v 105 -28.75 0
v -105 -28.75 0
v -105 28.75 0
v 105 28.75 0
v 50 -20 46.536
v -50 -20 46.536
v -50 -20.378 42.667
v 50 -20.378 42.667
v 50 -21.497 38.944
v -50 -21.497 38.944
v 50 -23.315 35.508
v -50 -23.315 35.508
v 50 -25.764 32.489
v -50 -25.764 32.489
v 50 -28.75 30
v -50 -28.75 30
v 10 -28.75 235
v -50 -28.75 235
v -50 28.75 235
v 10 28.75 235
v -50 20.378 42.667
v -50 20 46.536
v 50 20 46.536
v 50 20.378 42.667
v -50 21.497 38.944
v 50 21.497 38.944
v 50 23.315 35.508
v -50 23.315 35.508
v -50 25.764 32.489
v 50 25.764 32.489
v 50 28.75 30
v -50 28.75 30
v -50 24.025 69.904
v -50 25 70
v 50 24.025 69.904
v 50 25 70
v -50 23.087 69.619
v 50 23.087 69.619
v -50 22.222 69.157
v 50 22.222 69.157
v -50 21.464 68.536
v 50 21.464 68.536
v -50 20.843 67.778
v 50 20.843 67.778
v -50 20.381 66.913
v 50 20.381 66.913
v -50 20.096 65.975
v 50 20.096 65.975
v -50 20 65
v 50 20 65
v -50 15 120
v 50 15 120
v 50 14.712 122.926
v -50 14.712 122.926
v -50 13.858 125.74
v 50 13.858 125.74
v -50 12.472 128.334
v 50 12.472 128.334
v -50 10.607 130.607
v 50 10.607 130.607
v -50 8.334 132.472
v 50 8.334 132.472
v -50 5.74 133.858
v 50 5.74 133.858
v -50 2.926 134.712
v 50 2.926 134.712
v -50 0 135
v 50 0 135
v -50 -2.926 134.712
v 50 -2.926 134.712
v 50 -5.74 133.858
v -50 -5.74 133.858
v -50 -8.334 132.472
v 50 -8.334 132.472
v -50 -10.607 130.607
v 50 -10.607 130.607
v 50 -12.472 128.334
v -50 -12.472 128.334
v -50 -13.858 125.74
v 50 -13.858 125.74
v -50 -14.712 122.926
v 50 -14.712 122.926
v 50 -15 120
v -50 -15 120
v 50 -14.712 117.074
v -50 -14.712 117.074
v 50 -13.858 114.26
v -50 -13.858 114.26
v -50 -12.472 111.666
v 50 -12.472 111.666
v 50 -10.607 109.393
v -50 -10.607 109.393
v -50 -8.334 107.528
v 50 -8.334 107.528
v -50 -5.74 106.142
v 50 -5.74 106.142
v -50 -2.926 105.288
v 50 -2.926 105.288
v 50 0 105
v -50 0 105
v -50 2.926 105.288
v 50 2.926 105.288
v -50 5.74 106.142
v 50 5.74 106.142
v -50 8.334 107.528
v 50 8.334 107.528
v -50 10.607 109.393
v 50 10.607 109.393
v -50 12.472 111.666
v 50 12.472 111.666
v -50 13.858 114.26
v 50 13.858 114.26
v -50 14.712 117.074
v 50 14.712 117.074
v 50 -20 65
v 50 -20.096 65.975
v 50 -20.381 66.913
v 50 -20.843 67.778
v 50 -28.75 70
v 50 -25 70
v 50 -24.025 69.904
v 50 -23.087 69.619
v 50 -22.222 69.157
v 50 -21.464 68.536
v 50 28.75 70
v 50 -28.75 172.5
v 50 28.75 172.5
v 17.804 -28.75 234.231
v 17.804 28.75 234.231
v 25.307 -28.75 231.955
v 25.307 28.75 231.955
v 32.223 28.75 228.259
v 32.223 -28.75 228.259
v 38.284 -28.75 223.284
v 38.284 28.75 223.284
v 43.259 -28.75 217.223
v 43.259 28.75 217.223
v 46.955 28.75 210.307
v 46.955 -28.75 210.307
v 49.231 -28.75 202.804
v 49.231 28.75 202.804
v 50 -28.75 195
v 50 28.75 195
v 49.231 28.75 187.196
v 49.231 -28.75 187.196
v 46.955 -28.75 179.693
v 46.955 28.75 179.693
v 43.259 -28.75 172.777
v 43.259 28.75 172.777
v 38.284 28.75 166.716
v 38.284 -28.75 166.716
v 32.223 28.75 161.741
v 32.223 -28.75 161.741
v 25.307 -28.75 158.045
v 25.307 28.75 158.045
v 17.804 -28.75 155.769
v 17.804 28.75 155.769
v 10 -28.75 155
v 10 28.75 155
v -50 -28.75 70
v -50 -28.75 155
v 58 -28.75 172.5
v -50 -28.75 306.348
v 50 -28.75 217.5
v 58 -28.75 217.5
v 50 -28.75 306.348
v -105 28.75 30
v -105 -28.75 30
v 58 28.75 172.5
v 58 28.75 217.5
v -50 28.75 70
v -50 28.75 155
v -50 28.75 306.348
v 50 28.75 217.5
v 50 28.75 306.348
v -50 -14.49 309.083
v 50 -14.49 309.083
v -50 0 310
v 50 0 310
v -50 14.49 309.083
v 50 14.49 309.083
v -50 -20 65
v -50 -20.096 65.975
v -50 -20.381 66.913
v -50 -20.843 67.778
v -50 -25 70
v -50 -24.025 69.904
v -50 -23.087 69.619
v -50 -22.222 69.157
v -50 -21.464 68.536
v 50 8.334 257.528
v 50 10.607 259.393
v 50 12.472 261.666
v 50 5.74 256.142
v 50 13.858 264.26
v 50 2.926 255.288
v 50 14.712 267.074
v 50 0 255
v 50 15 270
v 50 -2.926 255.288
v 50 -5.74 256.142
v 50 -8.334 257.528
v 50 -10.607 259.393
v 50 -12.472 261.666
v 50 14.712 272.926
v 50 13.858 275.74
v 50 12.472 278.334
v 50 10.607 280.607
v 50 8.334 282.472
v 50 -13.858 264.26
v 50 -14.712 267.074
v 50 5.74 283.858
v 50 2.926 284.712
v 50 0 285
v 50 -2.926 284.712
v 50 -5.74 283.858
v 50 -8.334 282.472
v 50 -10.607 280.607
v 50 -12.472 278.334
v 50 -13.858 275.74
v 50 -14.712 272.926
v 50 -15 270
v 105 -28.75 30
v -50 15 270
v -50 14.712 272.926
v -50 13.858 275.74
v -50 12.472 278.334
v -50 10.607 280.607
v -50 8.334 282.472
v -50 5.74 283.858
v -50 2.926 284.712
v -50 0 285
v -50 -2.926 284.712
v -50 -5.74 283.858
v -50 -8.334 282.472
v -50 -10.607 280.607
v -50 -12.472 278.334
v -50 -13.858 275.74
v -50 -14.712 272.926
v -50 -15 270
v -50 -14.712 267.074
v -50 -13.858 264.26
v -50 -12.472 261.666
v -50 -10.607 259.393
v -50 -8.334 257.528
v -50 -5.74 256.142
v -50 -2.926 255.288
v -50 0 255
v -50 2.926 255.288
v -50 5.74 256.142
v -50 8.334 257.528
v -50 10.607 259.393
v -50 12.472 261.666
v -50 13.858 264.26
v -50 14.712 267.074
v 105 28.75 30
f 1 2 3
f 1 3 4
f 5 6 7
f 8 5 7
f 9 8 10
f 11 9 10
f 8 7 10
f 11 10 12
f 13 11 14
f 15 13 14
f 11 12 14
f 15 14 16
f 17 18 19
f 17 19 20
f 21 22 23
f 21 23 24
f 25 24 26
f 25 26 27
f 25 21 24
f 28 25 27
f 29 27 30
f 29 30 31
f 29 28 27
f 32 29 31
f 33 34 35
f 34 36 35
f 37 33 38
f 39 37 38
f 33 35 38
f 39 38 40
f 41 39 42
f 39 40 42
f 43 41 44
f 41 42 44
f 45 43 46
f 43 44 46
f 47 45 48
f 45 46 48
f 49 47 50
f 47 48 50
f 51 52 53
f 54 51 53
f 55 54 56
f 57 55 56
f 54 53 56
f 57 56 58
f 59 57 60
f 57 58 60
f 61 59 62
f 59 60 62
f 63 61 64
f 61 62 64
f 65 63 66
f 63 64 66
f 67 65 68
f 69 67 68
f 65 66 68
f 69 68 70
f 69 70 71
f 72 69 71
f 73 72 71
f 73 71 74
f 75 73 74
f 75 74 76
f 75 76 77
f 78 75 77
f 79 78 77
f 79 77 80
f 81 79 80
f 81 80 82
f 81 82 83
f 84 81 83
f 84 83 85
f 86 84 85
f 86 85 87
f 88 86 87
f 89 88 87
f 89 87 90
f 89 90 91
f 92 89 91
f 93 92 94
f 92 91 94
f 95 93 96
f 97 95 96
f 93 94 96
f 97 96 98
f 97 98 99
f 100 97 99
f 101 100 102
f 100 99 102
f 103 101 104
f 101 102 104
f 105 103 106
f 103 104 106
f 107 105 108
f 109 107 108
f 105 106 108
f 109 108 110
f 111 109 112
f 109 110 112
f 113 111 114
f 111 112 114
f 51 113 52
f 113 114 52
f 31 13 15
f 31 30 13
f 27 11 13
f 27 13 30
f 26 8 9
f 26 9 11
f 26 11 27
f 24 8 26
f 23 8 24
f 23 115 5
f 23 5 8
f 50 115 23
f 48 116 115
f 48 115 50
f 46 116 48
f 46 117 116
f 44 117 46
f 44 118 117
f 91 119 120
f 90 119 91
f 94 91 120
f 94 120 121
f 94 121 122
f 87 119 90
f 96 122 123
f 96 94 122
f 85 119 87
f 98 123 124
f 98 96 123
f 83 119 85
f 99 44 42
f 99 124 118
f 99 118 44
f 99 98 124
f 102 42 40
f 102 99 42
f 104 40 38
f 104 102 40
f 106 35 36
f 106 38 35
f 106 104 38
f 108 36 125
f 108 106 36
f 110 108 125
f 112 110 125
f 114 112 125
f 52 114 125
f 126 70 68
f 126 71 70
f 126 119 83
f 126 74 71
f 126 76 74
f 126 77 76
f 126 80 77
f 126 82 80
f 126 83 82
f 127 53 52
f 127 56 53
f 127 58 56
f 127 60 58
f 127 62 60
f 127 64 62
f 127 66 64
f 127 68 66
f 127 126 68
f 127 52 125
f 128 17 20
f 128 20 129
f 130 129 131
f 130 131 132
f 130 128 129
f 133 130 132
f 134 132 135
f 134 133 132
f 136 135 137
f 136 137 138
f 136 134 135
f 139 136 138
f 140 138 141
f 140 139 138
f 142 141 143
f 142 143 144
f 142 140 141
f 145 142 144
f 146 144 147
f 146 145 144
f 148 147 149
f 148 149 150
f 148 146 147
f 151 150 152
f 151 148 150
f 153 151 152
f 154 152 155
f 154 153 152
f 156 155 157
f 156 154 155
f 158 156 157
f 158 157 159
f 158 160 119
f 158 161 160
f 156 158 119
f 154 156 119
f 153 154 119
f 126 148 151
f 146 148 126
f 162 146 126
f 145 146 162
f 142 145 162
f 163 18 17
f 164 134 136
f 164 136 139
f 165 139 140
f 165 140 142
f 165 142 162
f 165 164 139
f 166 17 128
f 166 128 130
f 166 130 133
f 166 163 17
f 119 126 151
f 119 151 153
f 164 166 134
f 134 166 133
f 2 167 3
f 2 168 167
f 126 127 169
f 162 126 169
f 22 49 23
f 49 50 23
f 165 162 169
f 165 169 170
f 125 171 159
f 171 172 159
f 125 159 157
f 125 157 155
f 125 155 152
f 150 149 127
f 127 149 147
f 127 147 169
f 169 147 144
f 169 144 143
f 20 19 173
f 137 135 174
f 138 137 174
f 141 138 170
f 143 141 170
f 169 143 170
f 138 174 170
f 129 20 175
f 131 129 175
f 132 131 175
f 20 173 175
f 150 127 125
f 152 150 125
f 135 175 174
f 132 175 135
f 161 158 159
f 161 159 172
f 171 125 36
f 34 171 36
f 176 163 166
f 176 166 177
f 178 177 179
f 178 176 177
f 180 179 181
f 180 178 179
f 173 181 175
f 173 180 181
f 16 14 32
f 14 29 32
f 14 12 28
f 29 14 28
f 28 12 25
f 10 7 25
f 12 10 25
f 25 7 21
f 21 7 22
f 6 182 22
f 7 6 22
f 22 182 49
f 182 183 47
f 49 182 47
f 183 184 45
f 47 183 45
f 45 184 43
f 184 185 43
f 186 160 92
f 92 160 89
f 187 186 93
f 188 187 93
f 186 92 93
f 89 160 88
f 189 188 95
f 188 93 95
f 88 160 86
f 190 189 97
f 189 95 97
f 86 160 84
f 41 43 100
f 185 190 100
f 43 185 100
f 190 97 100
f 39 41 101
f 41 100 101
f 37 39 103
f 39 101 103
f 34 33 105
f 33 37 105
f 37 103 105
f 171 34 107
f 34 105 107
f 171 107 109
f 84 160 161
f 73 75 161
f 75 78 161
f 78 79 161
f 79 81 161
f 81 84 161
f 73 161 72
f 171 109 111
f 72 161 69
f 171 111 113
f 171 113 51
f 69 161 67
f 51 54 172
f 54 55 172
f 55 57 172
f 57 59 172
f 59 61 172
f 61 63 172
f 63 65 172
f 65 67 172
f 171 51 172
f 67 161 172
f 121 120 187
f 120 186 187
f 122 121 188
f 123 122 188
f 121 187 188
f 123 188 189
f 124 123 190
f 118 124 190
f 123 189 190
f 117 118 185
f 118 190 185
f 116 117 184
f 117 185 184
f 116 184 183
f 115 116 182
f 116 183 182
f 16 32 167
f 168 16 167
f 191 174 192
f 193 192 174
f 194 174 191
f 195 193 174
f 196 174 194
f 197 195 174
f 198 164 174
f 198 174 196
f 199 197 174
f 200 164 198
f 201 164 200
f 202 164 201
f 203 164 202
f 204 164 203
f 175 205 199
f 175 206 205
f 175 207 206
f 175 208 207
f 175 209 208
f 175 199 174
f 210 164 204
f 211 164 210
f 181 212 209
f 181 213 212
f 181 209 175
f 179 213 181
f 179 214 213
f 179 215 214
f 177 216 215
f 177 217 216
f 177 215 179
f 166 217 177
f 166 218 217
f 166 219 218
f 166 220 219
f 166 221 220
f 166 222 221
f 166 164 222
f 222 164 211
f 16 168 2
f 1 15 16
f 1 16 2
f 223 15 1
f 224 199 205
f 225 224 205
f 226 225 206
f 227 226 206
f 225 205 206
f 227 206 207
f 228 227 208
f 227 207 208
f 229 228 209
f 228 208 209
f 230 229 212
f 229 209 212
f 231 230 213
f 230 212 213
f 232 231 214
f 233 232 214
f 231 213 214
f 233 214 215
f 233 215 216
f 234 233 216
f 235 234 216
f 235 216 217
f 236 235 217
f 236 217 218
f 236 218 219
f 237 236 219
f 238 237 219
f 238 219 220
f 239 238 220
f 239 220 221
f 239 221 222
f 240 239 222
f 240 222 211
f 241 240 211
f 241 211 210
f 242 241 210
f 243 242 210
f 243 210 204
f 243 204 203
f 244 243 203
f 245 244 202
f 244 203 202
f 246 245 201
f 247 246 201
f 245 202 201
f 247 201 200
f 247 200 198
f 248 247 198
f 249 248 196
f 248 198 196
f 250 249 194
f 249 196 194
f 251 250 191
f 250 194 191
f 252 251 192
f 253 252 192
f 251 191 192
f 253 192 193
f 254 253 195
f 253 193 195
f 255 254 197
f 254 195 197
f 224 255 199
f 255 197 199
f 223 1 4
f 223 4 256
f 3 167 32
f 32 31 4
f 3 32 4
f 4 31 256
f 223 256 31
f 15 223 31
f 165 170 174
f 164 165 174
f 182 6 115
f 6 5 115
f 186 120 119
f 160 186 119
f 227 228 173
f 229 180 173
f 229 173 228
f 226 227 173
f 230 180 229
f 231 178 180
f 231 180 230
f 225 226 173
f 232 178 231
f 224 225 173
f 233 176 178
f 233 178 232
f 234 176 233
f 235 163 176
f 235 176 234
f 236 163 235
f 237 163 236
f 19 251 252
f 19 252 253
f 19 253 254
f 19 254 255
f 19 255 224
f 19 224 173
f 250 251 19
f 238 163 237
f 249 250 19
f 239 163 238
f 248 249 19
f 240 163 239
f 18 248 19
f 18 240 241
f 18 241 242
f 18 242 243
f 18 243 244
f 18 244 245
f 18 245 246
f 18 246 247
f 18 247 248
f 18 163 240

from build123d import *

# Parameters (mm, degrees)
F1_DEPTH      = 28.75
F3_DEPTH      = 105.001
F3_DEPTH_BACK = 105.001
F4_T1_DEPTH   = 100
F5_R          = 5
F7_D          = 30


# Not quite as in the source:
# - a fillet or chamfer that OpenCascade refuses, or shapes differently, is made with other operations: its cross-section is extruded or revolved along the edge and cut away or added


with BuildPart() as f1:
    # F0 (on Front) → F1 (new body, symmetric)
    with BuildSketch(Plane.XZ):
        with BuildLine():
            Line((-105, 30), (-105, 0))
            Line((-105, 0), (105, 0))
            Line((105, 0), (105, 30))
            Line((105, 30), (50, 30))
            Line((50, 30), (50, 172.5))
            Line((50, 172.5), (58, 172.5))
            Line((58, 172.5), (58, 217.5))
            Line((58, 217.5), (50, 217.5))
            Line((50, 217.5), (50, 315))
            Line((50, 315), (-50, 315))
            Line((-50, 315), (-50, 235))
            Line((-50, 235), (10, 235))
            ThreePointArc((10, 235), (50, 195), (10, 155))
            Line((10, 155), (-50, 155))
            Line((-50, 155), (-50, 30))
            Line((-50, 30), (-105, 30))
        make_face()
    extrude(amount=F1_DEPTH, both=True)

    # F2 (on Right) → F3 (cut, two sides)
    with BuildSketch(Plane.YZ) as f3_sk:
        with BuildLine():
            Line((-129.573866725, 348.6788272858), (-129.573866725, 30))
            Line((-129.573866725, 30), (-20, 30))
            Line((-20, 30), (-20, 70))
            Line((-20, 70), (-28.75, 70))
            Line((-28.75, 70), (-28.75, 306.3482712035))
            ThreePointArc((-28.75, 306.3482712035), (0, 310), (28.75, 306.3482712035))
            Line((28.75, 306.3482712035), (28.75, 70))
            Line((28.75, 70), (20, 70))
            Line((20, 70), (20, 30))
            Line((20, 30), (130.780075267, 30))
            Line((130.780075267, 30), (130.780075267, 348.6788272858))
            Line((130.780075267, 348.6788272858), (-129.573866725, 348.6788272858))
        make_face()
    extrude(amount=-F3_DEPTH, mode=Mode.SUBTRACT)
    extrude(f3_sk.sketch, amount=F3_DEPTH_BACK, mode=Mode.SUBTRACT)

    # F4: fillet of radius 20 on 2 edges, made by hand

    # F4_s2 → F4_t1 (join)
    with BuildSketch(Plane.YZ.offset(-50)):
        with BuildLine():
            ThreePointArc((-20, 46.5359456942), (-22.3223304703, 37.1818022272), (-28.75, 30))
            Line((-28.75, 30), (-20, 30))
            Line((-20, 30), (-20, 46.5359456942))
        make_face()
        with BuildLine():
            ThreePointArc((20, 46.5359456942), (22.3223304703, 37.1818022272), (28.75, 30))
            Line((28.75, 30), (20, 30))
            Line((20, 30), (20, 46.5359456942))
        make_face()
    extrude(amount=F4_T1_DEPTH)

    # F5
    f5_edges = [f1.edges().sort_by_distance(p)[0] for p in [
        (0, 20, 70),
        (0, -20, 70),
    ]]
    fillet(f5_edges, radius=F5_R)

    # F7 (through all)
    with Locations(Plane(origin=(-50, 0, 0), x_dir=(0, -1, 0), z_dir=(-1, 0, 0))):
        with Locations((0, 270), (0, 120)):
            Hole(F7_D / 2)


solid = f1.part
